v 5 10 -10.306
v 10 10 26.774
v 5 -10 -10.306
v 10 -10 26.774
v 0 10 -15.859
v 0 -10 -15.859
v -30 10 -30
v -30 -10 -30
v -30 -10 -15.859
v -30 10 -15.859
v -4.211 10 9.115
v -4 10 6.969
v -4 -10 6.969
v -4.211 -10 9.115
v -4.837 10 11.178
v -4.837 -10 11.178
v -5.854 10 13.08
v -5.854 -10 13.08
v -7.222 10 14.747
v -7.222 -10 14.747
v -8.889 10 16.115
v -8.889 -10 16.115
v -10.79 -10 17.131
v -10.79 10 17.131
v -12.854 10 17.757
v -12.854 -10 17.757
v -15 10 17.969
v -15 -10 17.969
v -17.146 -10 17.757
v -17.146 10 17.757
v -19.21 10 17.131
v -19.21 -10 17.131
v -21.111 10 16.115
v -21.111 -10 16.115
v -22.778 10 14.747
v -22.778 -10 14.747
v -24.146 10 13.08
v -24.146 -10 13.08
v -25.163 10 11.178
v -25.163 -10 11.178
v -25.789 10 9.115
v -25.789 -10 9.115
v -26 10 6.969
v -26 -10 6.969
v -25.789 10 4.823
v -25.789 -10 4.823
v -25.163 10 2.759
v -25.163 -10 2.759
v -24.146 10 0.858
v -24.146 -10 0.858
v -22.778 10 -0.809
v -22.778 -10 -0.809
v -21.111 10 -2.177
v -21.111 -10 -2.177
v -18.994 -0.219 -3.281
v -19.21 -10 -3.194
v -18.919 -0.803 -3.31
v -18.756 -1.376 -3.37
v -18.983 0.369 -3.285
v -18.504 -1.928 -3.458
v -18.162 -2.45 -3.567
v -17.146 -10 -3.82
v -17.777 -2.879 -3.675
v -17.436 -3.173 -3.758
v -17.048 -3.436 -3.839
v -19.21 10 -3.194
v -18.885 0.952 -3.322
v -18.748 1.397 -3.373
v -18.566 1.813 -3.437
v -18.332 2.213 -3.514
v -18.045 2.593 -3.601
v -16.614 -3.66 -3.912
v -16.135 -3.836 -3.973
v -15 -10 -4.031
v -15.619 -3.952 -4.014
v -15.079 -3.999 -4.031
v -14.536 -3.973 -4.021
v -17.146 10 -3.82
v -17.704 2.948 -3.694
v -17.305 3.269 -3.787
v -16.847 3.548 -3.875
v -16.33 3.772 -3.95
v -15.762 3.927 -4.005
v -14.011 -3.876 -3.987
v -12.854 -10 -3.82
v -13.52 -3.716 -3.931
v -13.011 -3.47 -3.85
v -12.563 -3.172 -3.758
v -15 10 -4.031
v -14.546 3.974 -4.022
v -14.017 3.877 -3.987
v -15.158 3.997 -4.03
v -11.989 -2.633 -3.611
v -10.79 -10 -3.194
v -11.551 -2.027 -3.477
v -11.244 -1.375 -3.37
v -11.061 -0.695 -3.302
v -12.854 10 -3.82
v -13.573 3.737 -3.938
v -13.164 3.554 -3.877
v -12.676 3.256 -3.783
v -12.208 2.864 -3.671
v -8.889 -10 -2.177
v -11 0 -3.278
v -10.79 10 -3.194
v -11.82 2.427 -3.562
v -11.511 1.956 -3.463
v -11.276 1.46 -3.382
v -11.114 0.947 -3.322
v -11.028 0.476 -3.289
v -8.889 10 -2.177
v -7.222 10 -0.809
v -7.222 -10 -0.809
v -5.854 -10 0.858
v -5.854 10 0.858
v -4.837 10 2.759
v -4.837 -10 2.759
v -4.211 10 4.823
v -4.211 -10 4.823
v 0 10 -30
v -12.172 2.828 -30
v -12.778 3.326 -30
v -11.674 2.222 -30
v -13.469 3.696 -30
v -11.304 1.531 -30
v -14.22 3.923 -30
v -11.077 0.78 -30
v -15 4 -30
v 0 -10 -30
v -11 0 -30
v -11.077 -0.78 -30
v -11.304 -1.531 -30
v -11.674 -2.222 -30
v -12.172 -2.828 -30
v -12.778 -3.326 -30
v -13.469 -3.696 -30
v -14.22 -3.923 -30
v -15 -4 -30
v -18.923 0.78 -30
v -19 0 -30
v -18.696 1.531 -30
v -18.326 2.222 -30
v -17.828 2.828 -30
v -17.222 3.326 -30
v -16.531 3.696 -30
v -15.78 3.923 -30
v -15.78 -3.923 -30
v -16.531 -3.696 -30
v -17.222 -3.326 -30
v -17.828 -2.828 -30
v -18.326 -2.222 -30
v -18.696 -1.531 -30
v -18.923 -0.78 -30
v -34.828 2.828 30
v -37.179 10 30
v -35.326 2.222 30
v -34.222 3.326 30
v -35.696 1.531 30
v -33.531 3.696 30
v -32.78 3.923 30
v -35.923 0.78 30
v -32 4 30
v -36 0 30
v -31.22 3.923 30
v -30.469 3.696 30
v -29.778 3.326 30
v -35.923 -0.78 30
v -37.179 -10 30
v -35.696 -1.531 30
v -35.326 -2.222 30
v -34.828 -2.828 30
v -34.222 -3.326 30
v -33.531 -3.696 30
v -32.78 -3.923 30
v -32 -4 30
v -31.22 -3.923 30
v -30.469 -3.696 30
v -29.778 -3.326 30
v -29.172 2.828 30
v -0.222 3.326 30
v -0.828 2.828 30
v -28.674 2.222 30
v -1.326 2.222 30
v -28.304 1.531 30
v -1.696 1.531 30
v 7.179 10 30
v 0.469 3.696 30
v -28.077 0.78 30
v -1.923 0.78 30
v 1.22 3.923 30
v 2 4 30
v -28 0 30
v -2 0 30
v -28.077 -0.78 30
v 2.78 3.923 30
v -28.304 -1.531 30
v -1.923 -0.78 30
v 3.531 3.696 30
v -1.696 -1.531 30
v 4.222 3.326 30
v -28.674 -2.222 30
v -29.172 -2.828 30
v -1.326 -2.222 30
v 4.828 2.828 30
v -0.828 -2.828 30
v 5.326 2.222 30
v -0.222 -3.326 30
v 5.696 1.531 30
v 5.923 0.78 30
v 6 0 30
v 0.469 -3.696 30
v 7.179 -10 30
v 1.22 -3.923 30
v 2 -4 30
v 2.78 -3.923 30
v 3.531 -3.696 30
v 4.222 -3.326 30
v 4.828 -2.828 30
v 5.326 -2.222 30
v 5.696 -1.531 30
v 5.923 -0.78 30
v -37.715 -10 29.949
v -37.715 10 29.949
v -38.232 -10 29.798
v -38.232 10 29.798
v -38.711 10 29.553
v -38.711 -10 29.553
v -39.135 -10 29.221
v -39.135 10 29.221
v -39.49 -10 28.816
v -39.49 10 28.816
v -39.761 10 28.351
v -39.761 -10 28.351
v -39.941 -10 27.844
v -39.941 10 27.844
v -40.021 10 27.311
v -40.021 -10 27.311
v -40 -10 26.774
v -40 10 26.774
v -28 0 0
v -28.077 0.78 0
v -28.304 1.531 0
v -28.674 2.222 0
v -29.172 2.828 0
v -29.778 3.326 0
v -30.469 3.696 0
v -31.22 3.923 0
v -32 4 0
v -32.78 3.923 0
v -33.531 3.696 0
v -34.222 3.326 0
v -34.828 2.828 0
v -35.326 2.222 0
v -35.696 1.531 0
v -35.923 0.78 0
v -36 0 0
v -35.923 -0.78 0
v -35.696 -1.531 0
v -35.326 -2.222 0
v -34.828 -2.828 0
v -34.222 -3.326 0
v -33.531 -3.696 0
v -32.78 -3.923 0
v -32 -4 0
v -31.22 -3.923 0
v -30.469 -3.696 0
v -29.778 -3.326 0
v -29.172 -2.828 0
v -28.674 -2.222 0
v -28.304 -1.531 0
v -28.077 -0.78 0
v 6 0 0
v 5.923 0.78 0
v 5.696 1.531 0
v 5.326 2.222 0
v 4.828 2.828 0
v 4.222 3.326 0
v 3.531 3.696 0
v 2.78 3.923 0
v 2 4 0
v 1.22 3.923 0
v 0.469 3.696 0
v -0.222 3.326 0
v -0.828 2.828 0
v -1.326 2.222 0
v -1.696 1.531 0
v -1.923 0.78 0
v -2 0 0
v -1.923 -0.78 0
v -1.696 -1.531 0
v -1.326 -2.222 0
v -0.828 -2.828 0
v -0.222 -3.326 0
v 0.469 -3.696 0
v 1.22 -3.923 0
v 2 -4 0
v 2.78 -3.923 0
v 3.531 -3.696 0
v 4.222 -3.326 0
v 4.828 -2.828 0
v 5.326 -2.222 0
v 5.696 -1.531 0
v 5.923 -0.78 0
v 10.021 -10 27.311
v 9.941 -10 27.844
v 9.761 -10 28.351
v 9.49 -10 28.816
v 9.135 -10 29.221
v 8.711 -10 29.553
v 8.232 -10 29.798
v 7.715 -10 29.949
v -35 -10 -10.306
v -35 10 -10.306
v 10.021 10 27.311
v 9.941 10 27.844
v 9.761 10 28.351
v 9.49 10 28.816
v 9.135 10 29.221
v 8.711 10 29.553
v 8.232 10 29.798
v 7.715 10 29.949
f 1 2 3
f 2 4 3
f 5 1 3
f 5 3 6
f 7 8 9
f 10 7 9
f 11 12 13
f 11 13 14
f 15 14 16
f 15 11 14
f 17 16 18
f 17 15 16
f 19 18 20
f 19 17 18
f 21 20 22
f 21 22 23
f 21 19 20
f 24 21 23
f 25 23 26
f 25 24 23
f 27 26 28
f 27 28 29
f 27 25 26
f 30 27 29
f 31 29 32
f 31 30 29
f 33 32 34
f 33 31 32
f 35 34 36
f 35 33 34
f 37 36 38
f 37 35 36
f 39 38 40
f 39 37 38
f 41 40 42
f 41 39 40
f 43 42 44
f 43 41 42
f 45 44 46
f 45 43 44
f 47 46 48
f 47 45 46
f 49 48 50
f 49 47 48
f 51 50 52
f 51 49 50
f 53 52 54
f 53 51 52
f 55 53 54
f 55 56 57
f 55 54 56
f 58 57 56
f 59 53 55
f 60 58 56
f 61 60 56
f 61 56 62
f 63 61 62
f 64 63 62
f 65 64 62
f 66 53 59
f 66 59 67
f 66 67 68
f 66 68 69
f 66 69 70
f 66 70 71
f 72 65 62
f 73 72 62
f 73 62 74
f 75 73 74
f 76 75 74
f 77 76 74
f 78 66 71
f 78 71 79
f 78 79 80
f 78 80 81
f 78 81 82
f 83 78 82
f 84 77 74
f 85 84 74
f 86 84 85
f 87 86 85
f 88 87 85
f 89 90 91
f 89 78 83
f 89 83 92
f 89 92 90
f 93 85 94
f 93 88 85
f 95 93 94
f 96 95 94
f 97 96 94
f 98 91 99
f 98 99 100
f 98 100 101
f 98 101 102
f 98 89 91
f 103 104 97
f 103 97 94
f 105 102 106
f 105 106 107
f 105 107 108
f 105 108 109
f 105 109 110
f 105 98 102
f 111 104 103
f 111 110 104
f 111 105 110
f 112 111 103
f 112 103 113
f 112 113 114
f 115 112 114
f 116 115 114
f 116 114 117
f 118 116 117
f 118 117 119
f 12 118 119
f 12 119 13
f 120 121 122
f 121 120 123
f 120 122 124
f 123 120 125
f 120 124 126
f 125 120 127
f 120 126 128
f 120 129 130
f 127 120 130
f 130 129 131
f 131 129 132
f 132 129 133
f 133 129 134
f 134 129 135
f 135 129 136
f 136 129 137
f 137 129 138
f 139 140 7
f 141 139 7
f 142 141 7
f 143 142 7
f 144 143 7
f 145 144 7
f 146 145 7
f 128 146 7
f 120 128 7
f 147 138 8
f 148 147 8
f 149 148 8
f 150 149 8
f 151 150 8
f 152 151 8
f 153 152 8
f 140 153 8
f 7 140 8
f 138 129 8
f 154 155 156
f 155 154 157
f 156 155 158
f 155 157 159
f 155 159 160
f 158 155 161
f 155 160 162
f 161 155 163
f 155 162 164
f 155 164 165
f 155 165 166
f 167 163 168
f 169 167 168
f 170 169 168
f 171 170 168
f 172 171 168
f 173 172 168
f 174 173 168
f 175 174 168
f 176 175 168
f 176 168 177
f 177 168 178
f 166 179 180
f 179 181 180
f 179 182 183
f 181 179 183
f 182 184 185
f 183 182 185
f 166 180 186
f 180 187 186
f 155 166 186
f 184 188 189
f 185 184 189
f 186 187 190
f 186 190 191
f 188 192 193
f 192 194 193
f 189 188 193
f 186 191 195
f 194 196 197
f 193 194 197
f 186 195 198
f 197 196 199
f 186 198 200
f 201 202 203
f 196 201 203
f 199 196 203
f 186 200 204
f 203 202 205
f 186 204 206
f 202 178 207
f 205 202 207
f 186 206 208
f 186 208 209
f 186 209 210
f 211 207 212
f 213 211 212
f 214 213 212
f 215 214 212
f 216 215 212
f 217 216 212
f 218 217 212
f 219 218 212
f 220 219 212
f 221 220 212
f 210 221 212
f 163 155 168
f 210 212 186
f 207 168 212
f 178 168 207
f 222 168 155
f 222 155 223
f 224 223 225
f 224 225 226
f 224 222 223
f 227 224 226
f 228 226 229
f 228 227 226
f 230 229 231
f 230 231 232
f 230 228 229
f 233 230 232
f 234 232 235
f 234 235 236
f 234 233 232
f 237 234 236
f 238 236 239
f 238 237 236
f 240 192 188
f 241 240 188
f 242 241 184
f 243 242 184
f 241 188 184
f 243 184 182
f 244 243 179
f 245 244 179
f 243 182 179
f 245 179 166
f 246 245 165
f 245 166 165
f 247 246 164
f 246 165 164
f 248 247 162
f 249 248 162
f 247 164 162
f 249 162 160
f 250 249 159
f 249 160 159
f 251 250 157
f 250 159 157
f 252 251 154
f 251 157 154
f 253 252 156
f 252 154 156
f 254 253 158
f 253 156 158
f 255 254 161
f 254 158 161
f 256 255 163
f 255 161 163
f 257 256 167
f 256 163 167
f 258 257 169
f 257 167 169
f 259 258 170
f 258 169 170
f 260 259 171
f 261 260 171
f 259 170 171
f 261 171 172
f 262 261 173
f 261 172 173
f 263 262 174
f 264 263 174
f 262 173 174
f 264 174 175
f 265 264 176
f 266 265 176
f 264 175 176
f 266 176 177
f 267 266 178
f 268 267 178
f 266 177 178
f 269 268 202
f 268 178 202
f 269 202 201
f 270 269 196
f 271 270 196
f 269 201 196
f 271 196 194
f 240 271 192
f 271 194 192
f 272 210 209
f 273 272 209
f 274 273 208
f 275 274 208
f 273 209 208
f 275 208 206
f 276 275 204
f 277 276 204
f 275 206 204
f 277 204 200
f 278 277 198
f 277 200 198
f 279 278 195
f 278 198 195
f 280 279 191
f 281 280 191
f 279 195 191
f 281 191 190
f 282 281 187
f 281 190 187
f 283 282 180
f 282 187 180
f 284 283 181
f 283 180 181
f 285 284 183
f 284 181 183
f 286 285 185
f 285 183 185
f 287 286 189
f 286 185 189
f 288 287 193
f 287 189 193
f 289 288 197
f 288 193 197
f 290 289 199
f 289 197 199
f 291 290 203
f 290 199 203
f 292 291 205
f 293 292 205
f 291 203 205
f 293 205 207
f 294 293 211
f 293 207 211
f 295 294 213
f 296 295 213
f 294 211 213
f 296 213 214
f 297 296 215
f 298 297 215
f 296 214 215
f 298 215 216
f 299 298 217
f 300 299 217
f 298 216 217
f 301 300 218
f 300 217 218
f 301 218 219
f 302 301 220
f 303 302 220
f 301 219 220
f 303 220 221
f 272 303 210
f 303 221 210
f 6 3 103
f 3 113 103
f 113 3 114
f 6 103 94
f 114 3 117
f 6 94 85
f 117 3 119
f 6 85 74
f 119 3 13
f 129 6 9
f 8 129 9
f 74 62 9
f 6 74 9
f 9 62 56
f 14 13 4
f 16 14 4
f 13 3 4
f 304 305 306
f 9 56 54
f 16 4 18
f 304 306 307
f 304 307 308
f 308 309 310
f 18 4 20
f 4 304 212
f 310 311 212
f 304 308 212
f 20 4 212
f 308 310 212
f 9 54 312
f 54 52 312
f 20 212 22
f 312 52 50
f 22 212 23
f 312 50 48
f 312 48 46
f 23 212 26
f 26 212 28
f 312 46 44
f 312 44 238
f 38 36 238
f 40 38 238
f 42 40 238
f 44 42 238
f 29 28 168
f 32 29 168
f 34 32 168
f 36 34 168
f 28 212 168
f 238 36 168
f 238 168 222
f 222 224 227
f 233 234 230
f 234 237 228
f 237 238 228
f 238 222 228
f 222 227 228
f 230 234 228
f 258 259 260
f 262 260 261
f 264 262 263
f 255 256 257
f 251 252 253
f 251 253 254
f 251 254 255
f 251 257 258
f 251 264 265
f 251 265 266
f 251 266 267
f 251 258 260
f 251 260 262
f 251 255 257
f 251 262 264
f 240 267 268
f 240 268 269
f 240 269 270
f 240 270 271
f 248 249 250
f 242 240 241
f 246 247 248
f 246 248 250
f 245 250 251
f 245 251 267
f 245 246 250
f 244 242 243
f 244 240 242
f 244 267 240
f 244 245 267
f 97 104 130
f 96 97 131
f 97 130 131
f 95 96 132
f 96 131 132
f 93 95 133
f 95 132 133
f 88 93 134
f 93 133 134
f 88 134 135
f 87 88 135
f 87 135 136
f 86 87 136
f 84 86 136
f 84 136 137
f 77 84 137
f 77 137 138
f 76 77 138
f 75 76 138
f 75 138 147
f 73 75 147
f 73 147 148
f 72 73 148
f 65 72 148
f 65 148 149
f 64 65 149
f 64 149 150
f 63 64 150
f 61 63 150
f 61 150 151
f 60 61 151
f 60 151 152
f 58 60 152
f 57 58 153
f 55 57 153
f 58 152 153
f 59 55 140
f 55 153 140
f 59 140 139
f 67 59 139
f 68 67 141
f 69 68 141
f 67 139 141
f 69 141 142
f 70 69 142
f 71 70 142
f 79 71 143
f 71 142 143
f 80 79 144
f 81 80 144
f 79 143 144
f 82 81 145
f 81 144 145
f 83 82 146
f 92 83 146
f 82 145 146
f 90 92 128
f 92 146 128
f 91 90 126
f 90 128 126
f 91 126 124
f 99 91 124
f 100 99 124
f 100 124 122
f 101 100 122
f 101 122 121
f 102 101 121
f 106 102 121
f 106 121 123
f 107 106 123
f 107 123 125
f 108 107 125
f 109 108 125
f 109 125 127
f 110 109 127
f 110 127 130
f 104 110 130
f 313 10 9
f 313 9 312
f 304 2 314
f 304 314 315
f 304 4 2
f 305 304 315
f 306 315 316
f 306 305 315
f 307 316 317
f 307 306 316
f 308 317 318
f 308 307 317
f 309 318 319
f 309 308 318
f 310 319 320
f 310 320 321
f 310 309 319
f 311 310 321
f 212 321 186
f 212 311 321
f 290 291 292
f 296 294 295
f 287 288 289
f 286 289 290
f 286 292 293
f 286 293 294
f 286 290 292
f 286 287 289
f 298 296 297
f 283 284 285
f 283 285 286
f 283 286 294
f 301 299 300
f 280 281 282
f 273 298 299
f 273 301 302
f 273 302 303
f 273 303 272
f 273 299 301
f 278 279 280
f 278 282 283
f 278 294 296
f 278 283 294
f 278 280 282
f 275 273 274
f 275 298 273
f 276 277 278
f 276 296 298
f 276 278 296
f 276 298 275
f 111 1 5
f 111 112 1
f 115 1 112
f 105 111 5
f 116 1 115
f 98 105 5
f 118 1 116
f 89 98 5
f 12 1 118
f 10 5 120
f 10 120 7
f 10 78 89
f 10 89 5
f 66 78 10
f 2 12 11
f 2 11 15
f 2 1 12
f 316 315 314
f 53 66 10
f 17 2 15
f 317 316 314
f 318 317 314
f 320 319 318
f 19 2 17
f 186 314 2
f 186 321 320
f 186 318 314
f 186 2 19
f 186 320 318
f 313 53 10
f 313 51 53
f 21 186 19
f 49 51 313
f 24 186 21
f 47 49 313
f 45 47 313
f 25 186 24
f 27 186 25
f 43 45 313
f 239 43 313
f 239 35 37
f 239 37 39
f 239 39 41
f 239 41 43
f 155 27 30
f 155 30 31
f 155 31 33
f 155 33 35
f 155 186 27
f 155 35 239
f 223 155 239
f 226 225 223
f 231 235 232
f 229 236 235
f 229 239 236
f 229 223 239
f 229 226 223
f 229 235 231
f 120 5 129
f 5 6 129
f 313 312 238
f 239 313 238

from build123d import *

# Parameters (mm, degrees)
SKETCH002_R      = 4
EXTRUDE002_DEPTH = 30
SKETCH001_R      = 4
EXTRUDE001_DEPTH = 30
SKETCH_R         = 11
EXTRUDE_DEPTH    = 10


with BuildPart() as extrude002:
    # Sketch002 (on Face1 of Cut) → Extrude002 (new body)
    with BuildSketch(Plane.XY.offset(30)):
        with Locations((2, 0)):
            Circle(SKETCH002_R)
        with Locations((-32, 0)):
            Circle(SKETCH002_R)
    extrude(amount=-EXTRUDE002_DEPTH)


with BuildPart() as extrude001:
    # Sketch001 (on Face6 of Extrude) → Extrude001 (new body)
    with BuildSketch(Plane(origin=(0, 0, -30), x_dir=(1, 0, 0), z_dir=(0, 0, -1))):
        with Locations((-15, 0)):
            Circle(SKETCH001_R)
    extrude(amount=-EXTRUDE001_DEPTH)


with BuildPart() as body:
    # Sketch → Extrude (new body, symmetric)
    with BuildSketch(Plane(origin=(-15, 0, -30), x_dir=(1, 0, 0), z_dir=(0, -1, 0))):
        with BuildLine():
            Line((-22.179407, 60), (22.179407, 60))
            ThreePointArc((25, 56.773532), (24.322176, 59.027097), (22.179407, 60))
            Line((25, 56.773532), (20, 19.694224))
            Line((20, 19.694224), (15, 14.141195))
            Line((15, 14.141195), (15, 0))
            Line((15, 0), (-15, 0))
            Line((-15, 0), (-15, 14.141195))
            Line((-15, 14.141195), (-20, 19.694224))
            Line((-20, 19.694224), (-25, 56.773532))
            ThreePointArc((-22.179407, 60), (-24.322176, 59.027097), (-25, 56.773532))
        make_face()
        with Locations((0, 36.968787)):
            Circle(SKETCH_R, mode=Mode.SUBTRACT)
    extrude(amount=EXTRUDE_DEPTH, both=True)

    # Cut: cut Extrude001
    add(extrude001.part, mode=Mode.SUBTRACT)

    # Cut001: cut Extrude002
    add(extrude002.part, mode=Mode.SUBTRACT)


solid = body.part
